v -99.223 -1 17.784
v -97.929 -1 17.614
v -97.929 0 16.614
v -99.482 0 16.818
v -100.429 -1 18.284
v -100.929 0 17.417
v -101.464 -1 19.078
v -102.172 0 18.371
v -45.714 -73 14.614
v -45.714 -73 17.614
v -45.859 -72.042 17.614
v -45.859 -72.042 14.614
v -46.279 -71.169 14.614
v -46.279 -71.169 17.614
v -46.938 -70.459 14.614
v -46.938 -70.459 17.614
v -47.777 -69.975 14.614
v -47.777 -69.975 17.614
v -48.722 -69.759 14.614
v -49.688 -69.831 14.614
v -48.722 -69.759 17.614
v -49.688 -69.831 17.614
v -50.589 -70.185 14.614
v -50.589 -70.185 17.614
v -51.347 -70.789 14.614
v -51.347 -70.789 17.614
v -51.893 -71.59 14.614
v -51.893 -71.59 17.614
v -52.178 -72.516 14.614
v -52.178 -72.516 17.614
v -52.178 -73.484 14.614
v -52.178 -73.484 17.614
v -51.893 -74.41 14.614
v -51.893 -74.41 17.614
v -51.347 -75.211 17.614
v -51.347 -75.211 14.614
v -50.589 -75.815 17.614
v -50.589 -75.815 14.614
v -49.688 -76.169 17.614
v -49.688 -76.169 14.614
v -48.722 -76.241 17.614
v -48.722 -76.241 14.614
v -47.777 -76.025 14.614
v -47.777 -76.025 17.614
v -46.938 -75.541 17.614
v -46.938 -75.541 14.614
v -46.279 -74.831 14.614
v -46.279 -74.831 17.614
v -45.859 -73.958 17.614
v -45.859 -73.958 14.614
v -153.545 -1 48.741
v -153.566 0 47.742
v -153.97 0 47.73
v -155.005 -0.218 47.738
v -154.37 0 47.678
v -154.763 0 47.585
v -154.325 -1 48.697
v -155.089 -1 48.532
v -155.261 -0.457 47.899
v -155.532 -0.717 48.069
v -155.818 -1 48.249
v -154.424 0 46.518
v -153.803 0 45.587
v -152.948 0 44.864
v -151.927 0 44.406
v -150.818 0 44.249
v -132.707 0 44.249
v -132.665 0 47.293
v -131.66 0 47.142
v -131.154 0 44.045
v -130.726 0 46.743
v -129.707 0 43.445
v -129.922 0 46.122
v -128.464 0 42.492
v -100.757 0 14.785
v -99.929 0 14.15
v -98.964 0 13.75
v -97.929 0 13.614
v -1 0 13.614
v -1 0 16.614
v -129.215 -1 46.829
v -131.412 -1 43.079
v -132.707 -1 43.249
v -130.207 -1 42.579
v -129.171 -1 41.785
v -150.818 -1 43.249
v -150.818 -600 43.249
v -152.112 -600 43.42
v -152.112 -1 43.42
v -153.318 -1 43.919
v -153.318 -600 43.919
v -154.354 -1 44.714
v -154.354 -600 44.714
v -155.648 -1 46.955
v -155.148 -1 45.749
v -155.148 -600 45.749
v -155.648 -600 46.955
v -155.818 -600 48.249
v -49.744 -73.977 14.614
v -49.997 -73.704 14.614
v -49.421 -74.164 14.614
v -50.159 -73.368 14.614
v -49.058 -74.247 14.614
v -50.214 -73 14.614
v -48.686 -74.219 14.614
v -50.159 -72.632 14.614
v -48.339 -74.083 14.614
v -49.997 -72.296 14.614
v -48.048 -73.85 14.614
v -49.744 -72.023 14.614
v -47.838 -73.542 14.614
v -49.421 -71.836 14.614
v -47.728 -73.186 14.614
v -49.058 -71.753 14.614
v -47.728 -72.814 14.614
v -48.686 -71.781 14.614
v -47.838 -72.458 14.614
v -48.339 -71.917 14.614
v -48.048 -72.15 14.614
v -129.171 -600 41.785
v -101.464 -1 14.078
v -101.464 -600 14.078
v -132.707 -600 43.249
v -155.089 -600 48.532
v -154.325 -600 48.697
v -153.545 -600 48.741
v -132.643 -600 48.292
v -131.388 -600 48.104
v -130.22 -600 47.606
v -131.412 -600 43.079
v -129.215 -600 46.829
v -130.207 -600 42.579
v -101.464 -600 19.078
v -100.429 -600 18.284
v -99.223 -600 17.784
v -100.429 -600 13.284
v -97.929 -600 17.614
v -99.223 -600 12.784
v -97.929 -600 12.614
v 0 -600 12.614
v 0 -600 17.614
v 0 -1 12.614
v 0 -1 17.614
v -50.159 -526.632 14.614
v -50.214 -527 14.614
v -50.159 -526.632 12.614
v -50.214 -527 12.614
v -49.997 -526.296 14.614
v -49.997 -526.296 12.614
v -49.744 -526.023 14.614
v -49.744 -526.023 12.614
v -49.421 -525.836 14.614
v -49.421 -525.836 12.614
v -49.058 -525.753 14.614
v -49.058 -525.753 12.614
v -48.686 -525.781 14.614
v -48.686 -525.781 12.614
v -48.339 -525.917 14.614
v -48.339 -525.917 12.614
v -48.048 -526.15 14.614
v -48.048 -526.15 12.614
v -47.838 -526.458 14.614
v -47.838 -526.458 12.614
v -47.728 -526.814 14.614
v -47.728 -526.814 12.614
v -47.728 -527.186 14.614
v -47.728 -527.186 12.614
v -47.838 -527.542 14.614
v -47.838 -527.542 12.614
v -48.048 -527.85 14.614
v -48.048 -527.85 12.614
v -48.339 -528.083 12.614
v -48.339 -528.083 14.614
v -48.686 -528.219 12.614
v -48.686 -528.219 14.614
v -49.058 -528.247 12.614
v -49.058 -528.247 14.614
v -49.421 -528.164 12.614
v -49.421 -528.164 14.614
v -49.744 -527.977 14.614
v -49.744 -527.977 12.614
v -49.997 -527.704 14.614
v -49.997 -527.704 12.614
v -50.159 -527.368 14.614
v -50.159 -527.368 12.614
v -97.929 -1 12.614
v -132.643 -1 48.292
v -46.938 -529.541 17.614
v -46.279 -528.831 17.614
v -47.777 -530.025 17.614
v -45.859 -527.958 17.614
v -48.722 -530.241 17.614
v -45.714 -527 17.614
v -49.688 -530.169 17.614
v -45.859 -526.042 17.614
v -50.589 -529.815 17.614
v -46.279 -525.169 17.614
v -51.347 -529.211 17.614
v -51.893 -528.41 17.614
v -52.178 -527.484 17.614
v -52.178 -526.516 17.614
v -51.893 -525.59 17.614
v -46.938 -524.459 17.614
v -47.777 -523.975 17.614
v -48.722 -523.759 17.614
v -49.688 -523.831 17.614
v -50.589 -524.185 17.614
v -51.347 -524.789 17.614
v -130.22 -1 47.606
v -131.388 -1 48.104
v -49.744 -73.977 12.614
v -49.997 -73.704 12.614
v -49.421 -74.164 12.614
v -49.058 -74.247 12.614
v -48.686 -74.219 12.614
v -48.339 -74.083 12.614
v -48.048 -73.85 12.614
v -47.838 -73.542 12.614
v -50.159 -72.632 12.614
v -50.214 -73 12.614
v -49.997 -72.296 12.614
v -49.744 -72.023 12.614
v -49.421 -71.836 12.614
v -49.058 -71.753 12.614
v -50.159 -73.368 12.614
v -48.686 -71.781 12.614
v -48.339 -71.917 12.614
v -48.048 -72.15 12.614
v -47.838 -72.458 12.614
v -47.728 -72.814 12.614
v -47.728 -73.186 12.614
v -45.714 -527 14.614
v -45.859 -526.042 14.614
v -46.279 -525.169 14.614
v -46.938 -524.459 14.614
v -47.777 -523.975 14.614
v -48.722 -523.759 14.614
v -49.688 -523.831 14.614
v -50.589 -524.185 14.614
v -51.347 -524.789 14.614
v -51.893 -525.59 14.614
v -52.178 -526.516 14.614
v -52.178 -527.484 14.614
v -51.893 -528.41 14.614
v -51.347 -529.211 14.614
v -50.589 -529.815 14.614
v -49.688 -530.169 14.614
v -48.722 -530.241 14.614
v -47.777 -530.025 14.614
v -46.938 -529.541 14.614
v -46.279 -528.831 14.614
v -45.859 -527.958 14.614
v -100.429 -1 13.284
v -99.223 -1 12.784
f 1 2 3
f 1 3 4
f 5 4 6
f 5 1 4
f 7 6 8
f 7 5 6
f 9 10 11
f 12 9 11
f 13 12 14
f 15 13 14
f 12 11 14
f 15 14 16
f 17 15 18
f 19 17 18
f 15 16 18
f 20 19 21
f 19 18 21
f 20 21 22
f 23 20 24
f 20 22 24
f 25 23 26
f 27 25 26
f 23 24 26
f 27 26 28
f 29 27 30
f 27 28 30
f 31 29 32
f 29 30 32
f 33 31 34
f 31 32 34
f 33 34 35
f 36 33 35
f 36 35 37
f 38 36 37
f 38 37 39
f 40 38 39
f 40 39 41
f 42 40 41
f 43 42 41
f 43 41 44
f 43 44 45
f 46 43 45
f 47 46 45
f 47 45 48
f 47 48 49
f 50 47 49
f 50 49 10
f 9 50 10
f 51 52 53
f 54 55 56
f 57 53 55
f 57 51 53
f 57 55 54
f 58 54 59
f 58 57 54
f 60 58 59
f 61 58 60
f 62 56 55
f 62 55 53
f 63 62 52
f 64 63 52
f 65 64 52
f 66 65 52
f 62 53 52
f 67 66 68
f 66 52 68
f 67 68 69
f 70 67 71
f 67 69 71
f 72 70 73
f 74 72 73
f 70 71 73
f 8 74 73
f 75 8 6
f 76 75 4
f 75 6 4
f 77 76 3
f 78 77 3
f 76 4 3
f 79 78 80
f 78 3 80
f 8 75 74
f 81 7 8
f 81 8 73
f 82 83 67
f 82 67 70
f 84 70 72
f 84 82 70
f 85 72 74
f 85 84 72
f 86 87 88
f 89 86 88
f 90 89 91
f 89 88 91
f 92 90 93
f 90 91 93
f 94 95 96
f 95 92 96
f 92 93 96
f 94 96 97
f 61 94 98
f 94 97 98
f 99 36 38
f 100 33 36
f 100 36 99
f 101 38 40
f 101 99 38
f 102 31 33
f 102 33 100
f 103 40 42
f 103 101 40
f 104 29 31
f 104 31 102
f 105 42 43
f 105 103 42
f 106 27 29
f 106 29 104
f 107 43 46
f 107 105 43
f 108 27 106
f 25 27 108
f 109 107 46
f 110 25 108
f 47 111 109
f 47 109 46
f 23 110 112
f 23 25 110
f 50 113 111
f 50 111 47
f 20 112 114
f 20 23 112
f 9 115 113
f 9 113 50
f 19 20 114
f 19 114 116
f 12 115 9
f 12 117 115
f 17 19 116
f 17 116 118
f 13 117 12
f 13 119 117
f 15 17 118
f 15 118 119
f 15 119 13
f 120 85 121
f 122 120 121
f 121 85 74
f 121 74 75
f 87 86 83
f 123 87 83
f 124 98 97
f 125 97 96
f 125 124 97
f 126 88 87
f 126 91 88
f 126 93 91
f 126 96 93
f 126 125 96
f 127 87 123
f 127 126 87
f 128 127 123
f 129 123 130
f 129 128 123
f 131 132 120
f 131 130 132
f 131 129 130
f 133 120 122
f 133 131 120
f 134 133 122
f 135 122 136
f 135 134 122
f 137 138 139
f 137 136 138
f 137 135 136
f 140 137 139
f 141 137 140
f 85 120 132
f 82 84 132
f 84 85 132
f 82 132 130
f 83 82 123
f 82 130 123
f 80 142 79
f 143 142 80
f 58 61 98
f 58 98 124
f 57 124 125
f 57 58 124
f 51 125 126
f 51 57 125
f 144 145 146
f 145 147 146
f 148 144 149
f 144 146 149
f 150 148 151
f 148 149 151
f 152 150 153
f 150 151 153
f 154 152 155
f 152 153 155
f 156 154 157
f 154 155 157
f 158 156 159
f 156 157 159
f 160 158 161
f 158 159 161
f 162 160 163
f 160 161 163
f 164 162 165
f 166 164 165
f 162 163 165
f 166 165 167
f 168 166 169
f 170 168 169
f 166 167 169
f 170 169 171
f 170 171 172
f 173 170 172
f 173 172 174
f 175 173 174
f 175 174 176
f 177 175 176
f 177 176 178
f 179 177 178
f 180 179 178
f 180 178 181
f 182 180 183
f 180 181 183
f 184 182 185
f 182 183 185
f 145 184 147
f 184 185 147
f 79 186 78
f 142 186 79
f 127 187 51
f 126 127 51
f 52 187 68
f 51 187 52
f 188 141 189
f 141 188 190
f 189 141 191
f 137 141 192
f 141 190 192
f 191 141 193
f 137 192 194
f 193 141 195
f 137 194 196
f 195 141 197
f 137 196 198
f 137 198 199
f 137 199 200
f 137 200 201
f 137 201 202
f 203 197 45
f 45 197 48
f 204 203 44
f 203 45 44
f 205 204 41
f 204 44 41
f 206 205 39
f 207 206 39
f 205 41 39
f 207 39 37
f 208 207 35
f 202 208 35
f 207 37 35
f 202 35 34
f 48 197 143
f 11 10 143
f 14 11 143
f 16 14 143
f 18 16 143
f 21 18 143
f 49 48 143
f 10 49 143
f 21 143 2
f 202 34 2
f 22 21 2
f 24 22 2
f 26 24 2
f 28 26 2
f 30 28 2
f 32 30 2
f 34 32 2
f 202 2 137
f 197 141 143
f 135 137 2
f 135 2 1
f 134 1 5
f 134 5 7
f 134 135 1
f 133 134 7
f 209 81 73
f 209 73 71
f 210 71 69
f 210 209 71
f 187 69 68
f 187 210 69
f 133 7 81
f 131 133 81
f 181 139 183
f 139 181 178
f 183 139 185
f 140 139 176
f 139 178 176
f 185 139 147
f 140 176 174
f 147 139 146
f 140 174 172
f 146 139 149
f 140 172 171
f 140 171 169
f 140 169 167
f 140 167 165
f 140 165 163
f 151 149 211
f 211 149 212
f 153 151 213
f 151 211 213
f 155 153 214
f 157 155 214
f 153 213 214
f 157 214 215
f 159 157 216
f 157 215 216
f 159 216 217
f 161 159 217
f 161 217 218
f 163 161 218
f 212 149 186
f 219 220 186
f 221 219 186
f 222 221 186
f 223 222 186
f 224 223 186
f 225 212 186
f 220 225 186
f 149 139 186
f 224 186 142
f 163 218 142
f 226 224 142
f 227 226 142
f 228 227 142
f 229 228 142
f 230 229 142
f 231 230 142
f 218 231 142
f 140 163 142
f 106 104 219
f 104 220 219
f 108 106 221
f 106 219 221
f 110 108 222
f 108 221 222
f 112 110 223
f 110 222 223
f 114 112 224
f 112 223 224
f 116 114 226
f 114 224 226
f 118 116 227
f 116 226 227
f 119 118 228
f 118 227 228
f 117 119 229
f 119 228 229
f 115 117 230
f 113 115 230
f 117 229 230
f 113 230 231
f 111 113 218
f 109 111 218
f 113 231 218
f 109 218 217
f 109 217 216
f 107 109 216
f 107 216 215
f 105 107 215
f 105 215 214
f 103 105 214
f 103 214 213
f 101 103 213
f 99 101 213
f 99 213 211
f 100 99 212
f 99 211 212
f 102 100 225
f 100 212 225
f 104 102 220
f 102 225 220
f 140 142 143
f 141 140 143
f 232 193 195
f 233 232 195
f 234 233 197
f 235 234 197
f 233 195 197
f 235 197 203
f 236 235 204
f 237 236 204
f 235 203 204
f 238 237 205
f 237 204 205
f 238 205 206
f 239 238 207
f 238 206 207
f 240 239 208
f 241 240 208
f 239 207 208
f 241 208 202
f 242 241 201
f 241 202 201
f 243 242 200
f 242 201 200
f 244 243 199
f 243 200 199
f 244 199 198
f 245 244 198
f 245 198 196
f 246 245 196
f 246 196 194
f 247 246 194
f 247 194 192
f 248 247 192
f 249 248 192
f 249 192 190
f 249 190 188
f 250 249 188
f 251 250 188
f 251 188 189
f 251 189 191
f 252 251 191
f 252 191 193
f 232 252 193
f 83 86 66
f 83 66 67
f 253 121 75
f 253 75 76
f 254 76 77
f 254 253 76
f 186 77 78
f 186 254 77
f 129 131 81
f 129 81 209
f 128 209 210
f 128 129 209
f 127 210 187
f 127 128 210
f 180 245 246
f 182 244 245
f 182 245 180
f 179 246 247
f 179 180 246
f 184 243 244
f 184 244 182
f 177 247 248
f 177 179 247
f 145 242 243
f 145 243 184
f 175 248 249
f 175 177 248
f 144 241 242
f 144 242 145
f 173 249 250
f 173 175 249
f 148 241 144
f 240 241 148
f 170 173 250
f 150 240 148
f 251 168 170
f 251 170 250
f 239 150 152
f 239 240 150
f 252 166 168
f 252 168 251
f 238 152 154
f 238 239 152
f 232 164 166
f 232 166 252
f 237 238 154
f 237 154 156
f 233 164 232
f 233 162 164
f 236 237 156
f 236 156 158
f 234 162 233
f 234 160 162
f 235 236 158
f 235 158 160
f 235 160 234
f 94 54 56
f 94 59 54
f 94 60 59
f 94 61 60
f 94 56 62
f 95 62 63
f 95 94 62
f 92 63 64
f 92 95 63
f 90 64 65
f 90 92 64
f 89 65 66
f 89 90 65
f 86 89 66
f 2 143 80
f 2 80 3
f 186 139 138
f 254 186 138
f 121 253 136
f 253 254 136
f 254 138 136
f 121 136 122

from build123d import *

# Parameters (mm, degrees)
F1_DEPTH       = 600
F2_R           = 5
F3_R           = 5
F4_T1_DEPTH    = 611.3695297687
F5_SIZE        = 1
F7_D           = 2.5
F7_CBORE_D     = 6.5
F7_CBORE_DEPTH = 3


# Not quite as in the source:
# - a fillet or chamfer that OpenCascade refuses, or shapes differently, is made with other operations: its cross-section is extruded or revolved along the edge and cut away or added


with BuildPart() as f1:
    # F0 (on Front) → F1 (new body)
    with BuildSketch(Plane.XZ):
        Polygon((-100, 12.6136353192), (0, 12.6136353192), (0, 17.5048394176), (0, 17.6136353192), (-100, 17.6136353192), (-125.63551, 43.2491453192), (-130.63551, 48.2491453192), (-155.818130374, 48.7903356552), (-155.818130374, 43.2491453192), (-130.63551, 43.2491453192), align=None)
    extrude(amount=F1_DEPTH)

    # F2
    f2_edges = [f1.edges().sort_by_distance(p)[0] for p in [
        (-130.63551, -300, 48.249145),
        (-100, -300, 17.613635),
    ]]
    fillet(f2_edges, radius=F2_R)

    # F3
    f3_edges = [f1.edges().sort_by_distance(p)[0] for p in [
        (-130.63551, -300, 43.249145),
        (-100, -300, 12.613635),
        (-155.81813, -300, 43.249145),
    ]]
    fillet(f3_edges, radius=F3_R)

    # F4: fillet of radius 5 on 1 edges, made by hand

    # F4_s2 → F4_t1 (cut)
    with BuildSketch(Plane.XZ.offset(-5.6847648844)):
        with BuildLine():
            ThreePointArc((-155.818130374, 48.2491453192), (-154.7104681905, 48.6293523426), (-153.5447493368, 48.7414792682))
            Line((-153.5447493368, 48.7414792682), (-155.818130374, 48.7903356552))
            Line((-155.818130374, 48.7903356552), (-155.818130374, 48.2491453192))
        make_face()
    extrude(amount=F4_T1_DEPTH, mode=Mode.SUBTRACT)

    # F5
    f5_edges = [f1.edges().sort_by_distance(p)[0] for p in [
        (-48.964466, 0, 17.613635),
        (-48.964466, 0, 12.613635),
        (-115.317755, 0, 27.93139),
        (-130.793161, 0, 42.868543),
        (-141.762354, 0, 43.249145),
        (-154.353664, 0, 44.713611),
        (-143.094103, 0, 48.516888),
        (-130.787949, 0, 47.892026),
        (-154.710468, 0, 48.629352),
        (-99.842349, 0, 12.994238),
        (-99.842349, 0, 17.994238),
        (-115.339908, 0, 32.953543),
        (0, 0, 15.113635),
    ]]
    chamfer(f5_edges, length=F5_SIZE)

    # F7 (through all)
    with Locations(Plane.XY.offset(17.6136353192)):
        with Locations((-48.9644660941, -73), (-48.9644660941, -527)):
            CounterBoreHole(F7_D / 2, F7_CBORE_D / 2, F7_CBORE_DEPTH)


solid = f1.part
